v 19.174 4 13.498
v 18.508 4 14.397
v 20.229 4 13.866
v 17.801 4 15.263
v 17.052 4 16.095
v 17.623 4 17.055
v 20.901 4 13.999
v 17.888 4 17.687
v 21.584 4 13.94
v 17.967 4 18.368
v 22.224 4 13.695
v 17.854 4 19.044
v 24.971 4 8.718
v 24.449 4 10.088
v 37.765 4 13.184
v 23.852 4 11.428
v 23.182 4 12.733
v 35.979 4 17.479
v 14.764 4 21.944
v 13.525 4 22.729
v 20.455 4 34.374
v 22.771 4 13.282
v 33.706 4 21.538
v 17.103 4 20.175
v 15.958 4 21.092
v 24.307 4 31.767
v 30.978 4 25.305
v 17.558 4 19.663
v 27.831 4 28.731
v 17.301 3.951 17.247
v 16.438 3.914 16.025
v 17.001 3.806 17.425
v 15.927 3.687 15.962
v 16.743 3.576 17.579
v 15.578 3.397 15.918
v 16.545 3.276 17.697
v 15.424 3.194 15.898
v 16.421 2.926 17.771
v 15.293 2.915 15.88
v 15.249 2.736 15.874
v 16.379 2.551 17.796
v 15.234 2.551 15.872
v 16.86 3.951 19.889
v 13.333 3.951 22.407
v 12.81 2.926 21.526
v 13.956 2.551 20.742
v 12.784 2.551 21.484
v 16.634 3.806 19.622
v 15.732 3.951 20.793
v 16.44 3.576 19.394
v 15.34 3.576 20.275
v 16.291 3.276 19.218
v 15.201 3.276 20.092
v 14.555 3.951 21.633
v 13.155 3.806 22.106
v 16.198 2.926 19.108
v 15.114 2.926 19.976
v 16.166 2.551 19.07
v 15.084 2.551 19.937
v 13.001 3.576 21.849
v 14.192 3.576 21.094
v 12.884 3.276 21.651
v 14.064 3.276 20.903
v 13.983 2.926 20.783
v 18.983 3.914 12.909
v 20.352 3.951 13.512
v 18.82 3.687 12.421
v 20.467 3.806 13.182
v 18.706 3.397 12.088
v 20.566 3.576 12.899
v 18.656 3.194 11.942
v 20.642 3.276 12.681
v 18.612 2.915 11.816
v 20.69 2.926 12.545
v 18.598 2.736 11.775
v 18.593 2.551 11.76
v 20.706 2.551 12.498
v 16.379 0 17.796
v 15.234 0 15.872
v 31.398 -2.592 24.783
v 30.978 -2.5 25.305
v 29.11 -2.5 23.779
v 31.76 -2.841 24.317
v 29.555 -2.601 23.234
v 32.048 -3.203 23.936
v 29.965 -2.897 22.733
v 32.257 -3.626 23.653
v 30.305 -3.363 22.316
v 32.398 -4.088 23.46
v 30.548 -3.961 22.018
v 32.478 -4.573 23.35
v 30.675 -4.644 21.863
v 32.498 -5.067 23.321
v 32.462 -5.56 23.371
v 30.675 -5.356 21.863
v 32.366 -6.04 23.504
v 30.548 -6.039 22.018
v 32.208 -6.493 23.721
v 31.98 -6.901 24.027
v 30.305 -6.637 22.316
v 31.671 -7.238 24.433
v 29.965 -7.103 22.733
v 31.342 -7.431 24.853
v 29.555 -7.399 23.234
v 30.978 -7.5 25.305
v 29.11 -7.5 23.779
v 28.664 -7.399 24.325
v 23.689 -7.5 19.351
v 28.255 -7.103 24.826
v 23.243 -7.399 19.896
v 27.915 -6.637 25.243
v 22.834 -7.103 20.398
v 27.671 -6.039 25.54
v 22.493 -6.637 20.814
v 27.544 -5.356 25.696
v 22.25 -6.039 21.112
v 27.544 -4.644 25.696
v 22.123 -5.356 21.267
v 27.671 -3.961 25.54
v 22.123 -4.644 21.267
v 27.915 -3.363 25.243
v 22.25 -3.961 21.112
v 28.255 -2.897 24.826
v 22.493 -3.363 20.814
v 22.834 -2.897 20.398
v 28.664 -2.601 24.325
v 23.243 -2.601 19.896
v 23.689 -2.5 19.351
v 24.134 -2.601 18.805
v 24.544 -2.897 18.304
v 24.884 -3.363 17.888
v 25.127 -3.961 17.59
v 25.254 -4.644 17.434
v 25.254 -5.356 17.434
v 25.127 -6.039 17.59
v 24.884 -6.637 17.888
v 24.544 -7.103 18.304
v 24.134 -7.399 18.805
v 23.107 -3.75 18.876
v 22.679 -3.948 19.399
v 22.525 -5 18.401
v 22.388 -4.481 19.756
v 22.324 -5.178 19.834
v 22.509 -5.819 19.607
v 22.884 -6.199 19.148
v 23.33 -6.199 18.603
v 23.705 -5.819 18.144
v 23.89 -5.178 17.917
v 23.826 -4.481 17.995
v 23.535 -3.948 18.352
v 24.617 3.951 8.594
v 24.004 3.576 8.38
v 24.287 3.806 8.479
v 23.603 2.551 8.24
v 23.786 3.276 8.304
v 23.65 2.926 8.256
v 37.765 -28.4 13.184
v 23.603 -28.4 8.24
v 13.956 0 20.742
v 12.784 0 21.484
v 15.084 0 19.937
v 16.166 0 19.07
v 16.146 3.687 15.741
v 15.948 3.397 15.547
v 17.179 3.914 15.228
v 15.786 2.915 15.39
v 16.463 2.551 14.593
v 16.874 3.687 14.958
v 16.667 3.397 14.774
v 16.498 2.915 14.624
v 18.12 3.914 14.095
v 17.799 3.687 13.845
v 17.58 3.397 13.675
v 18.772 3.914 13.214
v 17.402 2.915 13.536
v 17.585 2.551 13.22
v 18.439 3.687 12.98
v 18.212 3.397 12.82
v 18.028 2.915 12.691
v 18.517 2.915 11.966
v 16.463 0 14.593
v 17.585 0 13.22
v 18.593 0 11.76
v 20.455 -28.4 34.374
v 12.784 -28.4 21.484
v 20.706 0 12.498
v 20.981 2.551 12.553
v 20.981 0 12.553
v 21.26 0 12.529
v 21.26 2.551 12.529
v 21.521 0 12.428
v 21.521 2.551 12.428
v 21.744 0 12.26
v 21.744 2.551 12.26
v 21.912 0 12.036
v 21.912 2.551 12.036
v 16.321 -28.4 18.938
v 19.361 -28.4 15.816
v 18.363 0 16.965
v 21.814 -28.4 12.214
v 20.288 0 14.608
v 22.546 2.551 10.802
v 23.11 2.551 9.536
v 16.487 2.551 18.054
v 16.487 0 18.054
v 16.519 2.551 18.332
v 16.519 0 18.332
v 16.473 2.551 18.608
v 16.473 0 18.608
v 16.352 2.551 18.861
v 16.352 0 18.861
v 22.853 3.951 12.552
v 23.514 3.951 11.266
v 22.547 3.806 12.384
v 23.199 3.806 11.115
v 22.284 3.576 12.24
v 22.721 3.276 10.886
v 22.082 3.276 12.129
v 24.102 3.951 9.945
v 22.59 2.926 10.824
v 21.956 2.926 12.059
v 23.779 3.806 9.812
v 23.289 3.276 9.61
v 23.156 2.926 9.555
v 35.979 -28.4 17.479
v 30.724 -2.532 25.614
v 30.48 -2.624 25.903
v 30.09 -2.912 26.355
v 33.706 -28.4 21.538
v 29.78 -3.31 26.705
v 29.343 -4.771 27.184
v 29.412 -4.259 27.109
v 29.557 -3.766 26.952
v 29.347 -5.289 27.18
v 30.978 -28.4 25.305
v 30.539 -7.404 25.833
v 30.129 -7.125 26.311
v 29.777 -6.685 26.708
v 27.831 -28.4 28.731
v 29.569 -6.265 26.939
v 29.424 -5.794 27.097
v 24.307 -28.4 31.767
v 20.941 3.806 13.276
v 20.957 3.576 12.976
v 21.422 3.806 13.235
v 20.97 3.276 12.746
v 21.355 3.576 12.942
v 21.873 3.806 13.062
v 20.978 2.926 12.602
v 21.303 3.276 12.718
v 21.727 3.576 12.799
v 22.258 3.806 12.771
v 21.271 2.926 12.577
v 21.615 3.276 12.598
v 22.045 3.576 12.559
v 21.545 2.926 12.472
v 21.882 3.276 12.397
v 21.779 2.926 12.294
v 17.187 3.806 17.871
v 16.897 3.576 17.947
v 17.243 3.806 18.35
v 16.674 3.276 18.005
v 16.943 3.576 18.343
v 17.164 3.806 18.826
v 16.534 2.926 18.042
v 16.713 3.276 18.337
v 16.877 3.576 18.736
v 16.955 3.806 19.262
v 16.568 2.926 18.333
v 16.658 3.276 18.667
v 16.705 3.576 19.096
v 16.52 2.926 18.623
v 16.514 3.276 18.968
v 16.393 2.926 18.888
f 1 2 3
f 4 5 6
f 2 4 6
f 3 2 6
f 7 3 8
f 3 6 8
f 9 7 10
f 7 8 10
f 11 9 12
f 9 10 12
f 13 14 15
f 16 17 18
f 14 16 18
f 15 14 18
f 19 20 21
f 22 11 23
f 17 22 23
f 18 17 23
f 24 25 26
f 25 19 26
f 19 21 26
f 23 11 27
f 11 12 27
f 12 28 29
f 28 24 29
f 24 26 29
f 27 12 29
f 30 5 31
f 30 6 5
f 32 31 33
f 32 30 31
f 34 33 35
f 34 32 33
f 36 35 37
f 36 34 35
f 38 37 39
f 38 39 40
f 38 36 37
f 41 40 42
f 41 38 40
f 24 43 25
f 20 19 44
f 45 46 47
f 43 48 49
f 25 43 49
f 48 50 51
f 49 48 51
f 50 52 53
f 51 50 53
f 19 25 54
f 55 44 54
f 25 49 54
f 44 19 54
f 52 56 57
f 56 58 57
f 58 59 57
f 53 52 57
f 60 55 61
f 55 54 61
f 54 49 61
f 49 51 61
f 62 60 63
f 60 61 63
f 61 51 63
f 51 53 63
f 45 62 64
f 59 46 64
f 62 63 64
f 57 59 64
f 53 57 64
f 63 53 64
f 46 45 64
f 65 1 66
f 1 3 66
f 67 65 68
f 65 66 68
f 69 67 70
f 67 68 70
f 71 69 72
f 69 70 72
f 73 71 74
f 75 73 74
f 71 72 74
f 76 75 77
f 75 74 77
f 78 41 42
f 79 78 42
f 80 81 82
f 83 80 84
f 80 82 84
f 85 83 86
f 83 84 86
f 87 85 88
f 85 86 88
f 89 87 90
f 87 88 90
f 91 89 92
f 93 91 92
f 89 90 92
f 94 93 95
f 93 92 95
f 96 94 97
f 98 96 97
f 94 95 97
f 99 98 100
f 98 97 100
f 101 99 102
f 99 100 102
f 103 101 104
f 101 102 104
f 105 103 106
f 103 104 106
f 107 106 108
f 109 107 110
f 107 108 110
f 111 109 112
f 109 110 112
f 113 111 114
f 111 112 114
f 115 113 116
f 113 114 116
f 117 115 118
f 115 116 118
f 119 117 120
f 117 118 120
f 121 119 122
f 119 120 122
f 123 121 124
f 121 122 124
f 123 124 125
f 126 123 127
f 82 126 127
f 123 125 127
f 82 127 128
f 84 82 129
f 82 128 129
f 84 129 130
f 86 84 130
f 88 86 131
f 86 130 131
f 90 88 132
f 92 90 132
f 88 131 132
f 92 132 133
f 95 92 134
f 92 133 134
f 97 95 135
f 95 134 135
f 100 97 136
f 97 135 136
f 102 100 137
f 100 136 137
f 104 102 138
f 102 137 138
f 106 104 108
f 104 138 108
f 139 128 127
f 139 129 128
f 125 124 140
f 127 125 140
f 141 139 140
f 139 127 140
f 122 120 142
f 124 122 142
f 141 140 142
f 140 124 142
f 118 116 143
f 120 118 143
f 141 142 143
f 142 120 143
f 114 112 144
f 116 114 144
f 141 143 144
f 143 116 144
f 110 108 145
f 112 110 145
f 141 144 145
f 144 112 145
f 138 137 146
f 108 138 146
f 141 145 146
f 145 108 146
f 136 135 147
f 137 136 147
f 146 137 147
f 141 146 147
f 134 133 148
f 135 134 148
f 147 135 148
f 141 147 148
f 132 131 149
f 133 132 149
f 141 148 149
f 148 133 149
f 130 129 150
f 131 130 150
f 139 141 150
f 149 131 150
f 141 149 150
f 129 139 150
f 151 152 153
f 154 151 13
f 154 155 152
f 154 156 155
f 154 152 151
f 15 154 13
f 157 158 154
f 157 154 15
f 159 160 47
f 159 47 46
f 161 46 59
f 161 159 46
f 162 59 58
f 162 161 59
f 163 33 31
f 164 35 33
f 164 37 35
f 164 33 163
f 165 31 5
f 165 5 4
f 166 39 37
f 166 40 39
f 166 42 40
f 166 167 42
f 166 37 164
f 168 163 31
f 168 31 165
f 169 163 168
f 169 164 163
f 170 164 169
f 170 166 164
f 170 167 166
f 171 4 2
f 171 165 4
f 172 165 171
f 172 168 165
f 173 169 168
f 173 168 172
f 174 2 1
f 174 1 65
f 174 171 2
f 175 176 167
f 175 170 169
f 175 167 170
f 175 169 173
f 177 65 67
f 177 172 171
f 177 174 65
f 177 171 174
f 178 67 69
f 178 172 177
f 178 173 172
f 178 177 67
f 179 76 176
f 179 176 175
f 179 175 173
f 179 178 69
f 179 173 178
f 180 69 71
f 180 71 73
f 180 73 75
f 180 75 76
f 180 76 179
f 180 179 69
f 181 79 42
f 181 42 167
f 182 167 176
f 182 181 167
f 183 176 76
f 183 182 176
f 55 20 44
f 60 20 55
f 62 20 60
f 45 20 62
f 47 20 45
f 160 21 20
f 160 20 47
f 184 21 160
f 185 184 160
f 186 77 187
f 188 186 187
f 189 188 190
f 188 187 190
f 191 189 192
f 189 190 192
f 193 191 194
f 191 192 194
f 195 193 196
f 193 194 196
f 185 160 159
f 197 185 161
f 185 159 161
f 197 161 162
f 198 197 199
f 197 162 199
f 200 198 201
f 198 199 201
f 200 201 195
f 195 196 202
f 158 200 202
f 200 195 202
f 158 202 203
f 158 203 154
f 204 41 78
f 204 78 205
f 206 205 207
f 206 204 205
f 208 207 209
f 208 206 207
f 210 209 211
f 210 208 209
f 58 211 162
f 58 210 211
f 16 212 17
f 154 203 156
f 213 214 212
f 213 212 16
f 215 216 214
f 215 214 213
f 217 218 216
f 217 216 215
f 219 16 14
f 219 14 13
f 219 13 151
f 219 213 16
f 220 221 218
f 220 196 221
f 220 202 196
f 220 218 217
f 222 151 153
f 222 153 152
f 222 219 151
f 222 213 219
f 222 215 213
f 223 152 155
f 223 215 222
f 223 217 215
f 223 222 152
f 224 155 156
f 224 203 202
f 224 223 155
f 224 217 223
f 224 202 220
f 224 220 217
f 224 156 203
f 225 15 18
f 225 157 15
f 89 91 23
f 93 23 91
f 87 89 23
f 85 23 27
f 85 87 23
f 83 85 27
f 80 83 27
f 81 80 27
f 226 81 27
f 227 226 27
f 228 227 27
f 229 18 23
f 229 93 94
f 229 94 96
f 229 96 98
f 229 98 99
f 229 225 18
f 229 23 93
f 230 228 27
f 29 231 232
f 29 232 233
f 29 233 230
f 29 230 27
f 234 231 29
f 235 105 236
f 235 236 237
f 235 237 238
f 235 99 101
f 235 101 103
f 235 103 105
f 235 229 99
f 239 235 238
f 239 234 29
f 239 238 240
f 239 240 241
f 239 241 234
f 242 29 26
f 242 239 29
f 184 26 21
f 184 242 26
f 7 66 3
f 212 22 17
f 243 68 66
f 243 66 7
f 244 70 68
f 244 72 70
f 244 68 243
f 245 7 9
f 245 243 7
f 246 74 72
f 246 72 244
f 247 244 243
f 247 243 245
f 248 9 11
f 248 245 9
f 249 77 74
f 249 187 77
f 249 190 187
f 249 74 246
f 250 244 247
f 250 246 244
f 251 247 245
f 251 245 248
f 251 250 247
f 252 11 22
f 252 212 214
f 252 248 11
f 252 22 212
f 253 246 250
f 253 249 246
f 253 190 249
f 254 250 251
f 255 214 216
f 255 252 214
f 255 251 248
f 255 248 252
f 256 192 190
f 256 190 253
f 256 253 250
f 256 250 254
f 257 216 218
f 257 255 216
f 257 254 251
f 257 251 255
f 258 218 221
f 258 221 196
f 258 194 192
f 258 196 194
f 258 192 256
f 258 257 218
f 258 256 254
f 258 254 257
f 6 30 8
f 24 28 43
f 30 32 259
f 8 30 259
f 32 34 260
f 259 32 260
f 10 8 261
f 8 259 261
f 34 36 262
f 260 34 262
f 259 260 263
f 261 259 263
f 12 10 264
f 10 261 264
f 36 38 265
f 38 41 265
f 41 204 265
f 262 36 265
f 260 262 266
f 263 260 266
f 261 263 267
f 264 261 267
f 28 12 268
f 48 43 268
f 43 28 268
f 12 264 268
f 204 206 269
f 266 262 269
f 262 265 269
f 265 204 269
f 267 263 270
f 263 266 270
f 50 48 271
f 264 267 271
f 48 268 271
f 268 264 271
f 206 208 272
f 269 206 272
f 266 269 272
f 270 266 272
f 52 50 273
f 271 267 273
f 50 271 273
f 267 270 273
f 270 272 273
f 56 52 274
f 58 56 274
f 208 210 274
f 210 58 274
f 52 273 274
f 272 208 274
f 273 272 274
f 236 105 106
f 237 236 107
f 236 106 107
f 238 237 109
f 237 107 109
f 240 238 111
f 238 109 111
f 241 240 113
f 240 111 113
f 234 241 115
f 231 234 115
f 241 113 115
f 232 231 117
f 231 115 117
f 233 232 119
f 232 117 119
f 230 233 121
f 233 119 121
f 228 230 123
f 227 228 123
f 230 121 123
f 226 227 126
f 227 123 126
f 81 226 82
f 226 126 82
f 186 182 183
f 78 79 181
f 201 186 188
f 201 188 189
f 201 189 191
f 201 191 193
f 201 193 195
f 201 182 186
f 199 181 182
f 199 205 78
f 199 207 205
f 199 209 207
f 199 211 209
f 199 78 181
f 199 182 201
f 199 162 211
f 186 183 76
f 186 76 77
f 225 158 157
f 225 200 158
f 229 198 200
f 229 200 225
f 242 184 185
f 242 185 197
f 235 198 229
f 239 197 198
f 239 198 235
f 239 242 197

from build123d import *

# Parameters (mm, degrees)
F2_DEPTH = 28.4
F3_DEPTH = 4
F6_D     = 5
F6_DEPTH = 5
F6_TIP   = 1.5021515476
F7_D     = 5
F7_DEPTH = 7
F7_TIP   = 1.5021515476
F8_R     = 1
F9_R     = 1.4485281374


with BuildPart() as f2:
    # F0 (on Front) → F2 (new body)
    with BuildSketch(Plane.XZ):
        with BuildLine():
            Line((23.6029717884, 8.2401288069), (37.7647548615, 13.1842060911))
            ThreePointArc((37.7647548615, 13.1842060911), (30.9779974122, 25.3054080451), (20.4548362885, 34.3744043208))
            Line((20.4548362885, 34.3744043208), (12.7842726803, 21.4840027005))
            ThreePointArc((12.7842726803, 21.4840027005), (19.3612483826, 15.8158800282), (23.6029717884, 8.2401288069))
        make_face()
    extrude(amount=F2_DEPTH)

    # F1 (on Front) + F0 (on Front) → F3 (join)
    with BuildSketch(Plane.XZ):
        with BuildLine():
            ThreePointArc((15.2340019476, 15.8721512297), (17.0378985767, 13.9179744248), (18.5928148308, 11.7604097152))
            Line((18.5928148308, 11.7604097152), (21.4911474241, 12.7722583124))
            ThreePointArc((21.4911474241, 12.7722583124), (22.6606475272, 10.5591218219), (23.6029717884, 8.2401288069))
            Line((23.6029717884, 8.2401288069), (37.7647548615, 13.1842060911))
            ThreePointArc((37.7647548615, 13.1842060911), (30.9779974122, 25.3054080451), (20.4548362885, 34.3744043208))
            Line((20.4548362885, 34.3744043208), (12.7842726803, 21.4840027005))
            ThreePointArc((12.7842726803, 21.4840027005), (14.8685909795, 20.0978855177), (16.8038497839, 18.5102845046))
            Line((16.8038497839, 18.5102845046), (15.2340019476, 15.8721512297))
        make_face()
    with BuildSketch(Plane.XZ):
        with BuildLine():
            Line((23.6029717884, 8.2401288069), (37.7647548615, 13.1842060911))
            ThreePointArc((37.7647548615, 13.1842060911), (30.9779974122, 25.3054080451), (20.4548362885, 34.3744043208))
            Line((20.4548362885, 34.3744043208), (12.7842726803, 21.4840027005))
            ThreePointArc((12.7842726803, 21.4840027005), (19.3612483826, 15.8158800282), (23.6029717884, 8.2401288069))
        make_face()
    extrude(amount=-F3_DEPTH)

    # F6 (one way)
    with BuildSketch(Plane(origin=(29.109795575, 0, 23.7793052059), x_dir=(0, 1, 0), z_dir=(-0.7744499353, 0, -0.6326352011))):
        with Locations((-5, 0)):
            Circle(F6_D / 2)
    extrude(amount=-F6_DEPTH, mode=Mode.SUBTRACT)
    with Locations(Plane(origin=(29.109795575, 0, 23.7793052059), x_dir=(0, 1, 0), z_dir=(-0.7744499353, 0, -0.6326352011))):
        with Locations((-5, 0)):
            with Locations((0, 0, -(F6_DEPTH + F6_TIP / 2))):  # 118° drill point
                Cone(0, F6_D / 2, F6_TIP, mode=Mode.SUBTRACT)

    # F7
    with Locations(Plane(origin=(29.109795575, 0, 23.7793052059), x_dir=(0, 1, 0), z_dir=(0.7744499353, 0, 0.6326352011))):
        with Locations((-5, 0)):
            Hole(F7_D / 2, depth=F7_DEPTH)
            with Locations((0, 0, -(F7_DEPTH + F7_TIP / 2))):  # 118° drill point
                Cone(0, F7_D / 2, F7_TIP, mode=Mode.SUBTRACT)

    # F8
    f8_edges = [f2.edges().sort_by_distance(p)[0] for p in [
        (21.491147, 2, 12.772258),
        (16.80385, 2, 18.510285),
    ]]
    fillet(f8_edges, radius=F8_R)

    # F9
    f9_edges = [f2.edges().sort_by_distance(p)[0] for p in [
        (17.037899, 4, 13.917974),
        (16.505655, 4, 18.471804),
        (21.393938, 4, 12.487739),
    ]]
    fillet(f9_edges, radius=F9_R)


solid = f2.part
